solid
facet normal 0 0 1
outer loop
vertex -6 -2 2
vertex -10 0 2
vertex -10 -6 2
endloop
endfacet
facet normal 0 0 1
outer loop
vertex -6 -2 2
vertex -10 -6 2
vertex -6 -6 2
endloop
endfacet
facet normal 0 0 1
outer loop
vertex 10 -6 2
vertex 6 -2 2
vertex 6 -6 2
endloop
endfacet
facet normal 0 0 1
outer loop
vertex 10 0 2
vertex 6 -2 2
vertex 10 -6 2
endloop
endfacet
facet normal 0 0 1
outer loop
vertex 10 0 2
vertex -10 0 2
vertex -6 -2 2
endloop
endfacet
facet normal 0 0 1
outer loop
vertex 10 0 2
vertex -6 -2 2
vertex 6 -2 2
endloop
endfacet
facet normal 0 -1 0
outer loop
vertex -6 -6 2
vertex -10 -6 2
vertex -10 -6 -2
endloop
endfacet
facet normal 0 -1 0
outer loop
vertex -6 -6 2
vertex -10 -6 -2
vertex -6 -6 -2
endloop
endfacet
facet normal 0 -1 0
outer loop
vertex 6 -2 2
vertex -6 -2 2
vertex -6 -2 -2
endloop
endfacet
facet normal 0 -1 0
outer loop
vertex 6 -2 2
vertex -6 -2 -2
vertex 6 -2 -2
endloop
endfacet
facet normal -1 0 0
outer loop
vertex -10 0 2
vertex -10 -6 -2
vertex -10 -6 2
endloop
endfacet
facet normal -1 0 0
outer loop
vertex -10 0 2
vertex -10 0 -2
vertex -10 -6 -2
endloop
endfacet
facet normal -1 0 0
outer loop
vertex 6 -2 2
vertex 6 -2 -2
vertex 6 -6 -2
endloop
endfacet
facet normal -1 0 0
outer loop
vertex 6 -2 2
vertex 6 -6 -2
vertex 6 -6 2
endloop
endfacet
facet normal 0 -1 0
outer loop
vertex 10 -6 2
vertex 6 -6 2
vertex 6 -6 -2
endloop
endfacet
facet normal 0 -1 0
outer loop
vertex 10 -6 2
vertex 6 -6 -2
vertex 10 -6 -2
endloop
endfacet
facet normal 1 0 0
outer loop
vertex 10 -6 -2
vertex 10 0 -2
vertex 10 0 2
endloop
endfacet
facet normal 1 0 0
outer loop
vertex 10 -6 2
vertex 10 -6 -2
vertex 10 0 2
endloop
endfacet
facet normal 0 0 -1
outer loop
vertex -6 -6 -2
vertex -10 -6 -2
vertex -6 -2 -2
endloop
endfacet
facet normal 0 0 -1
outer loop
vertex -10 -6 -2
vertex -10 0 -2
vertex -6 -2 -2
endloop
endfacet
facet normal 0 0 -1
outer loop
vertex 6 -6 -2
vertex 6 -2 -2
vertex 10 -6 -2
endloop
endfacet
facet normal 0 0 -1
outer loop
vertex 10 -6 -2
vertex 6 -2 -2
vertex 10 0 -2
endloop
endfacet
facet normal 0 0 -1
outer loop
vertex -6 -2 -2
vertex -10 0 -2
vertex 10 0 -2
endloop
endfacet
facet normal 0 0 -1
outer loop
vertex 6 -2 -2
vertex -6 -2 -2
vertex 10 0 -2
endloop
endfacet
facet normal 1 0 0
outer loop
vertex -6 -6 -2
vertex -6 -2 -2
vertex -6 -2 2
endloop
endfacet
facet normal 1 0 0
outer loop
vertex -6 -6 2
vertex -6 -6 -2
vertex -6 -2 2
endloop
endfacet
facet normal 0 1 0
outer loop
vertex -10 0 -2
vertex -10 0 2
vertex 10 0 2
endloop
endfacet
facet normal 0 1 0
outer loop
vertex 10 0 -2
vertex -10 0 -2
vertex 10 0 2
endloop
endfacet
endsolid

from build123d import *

# Parameters (mm, degrees)
F0_W     = 20
F0_H     = 4
F1_DEPTH = 2
F2_W     = 4
F2_H     = 4
F3_DEPTH = 4


with BuildPart() as f1:
    # F0 (on Front) → F1 (new body)
    with BuildSketch(Plane.XZ):
        Rectangle(F0_W, F0_H)
    extrude(amount=F1_DEPTH)

    # F2 (on face) → F3 (join)
    with BuildSketch(Plane.XZ.offset(2)):
        with Locations((-8, 0)):
            Rectangle(F2_W, F2_H)
        with Locations((8, 0)):
            Rectangle(F2_W, F2_H)
    extrude(amount=F3_DEPTH)


solid = f1.part
